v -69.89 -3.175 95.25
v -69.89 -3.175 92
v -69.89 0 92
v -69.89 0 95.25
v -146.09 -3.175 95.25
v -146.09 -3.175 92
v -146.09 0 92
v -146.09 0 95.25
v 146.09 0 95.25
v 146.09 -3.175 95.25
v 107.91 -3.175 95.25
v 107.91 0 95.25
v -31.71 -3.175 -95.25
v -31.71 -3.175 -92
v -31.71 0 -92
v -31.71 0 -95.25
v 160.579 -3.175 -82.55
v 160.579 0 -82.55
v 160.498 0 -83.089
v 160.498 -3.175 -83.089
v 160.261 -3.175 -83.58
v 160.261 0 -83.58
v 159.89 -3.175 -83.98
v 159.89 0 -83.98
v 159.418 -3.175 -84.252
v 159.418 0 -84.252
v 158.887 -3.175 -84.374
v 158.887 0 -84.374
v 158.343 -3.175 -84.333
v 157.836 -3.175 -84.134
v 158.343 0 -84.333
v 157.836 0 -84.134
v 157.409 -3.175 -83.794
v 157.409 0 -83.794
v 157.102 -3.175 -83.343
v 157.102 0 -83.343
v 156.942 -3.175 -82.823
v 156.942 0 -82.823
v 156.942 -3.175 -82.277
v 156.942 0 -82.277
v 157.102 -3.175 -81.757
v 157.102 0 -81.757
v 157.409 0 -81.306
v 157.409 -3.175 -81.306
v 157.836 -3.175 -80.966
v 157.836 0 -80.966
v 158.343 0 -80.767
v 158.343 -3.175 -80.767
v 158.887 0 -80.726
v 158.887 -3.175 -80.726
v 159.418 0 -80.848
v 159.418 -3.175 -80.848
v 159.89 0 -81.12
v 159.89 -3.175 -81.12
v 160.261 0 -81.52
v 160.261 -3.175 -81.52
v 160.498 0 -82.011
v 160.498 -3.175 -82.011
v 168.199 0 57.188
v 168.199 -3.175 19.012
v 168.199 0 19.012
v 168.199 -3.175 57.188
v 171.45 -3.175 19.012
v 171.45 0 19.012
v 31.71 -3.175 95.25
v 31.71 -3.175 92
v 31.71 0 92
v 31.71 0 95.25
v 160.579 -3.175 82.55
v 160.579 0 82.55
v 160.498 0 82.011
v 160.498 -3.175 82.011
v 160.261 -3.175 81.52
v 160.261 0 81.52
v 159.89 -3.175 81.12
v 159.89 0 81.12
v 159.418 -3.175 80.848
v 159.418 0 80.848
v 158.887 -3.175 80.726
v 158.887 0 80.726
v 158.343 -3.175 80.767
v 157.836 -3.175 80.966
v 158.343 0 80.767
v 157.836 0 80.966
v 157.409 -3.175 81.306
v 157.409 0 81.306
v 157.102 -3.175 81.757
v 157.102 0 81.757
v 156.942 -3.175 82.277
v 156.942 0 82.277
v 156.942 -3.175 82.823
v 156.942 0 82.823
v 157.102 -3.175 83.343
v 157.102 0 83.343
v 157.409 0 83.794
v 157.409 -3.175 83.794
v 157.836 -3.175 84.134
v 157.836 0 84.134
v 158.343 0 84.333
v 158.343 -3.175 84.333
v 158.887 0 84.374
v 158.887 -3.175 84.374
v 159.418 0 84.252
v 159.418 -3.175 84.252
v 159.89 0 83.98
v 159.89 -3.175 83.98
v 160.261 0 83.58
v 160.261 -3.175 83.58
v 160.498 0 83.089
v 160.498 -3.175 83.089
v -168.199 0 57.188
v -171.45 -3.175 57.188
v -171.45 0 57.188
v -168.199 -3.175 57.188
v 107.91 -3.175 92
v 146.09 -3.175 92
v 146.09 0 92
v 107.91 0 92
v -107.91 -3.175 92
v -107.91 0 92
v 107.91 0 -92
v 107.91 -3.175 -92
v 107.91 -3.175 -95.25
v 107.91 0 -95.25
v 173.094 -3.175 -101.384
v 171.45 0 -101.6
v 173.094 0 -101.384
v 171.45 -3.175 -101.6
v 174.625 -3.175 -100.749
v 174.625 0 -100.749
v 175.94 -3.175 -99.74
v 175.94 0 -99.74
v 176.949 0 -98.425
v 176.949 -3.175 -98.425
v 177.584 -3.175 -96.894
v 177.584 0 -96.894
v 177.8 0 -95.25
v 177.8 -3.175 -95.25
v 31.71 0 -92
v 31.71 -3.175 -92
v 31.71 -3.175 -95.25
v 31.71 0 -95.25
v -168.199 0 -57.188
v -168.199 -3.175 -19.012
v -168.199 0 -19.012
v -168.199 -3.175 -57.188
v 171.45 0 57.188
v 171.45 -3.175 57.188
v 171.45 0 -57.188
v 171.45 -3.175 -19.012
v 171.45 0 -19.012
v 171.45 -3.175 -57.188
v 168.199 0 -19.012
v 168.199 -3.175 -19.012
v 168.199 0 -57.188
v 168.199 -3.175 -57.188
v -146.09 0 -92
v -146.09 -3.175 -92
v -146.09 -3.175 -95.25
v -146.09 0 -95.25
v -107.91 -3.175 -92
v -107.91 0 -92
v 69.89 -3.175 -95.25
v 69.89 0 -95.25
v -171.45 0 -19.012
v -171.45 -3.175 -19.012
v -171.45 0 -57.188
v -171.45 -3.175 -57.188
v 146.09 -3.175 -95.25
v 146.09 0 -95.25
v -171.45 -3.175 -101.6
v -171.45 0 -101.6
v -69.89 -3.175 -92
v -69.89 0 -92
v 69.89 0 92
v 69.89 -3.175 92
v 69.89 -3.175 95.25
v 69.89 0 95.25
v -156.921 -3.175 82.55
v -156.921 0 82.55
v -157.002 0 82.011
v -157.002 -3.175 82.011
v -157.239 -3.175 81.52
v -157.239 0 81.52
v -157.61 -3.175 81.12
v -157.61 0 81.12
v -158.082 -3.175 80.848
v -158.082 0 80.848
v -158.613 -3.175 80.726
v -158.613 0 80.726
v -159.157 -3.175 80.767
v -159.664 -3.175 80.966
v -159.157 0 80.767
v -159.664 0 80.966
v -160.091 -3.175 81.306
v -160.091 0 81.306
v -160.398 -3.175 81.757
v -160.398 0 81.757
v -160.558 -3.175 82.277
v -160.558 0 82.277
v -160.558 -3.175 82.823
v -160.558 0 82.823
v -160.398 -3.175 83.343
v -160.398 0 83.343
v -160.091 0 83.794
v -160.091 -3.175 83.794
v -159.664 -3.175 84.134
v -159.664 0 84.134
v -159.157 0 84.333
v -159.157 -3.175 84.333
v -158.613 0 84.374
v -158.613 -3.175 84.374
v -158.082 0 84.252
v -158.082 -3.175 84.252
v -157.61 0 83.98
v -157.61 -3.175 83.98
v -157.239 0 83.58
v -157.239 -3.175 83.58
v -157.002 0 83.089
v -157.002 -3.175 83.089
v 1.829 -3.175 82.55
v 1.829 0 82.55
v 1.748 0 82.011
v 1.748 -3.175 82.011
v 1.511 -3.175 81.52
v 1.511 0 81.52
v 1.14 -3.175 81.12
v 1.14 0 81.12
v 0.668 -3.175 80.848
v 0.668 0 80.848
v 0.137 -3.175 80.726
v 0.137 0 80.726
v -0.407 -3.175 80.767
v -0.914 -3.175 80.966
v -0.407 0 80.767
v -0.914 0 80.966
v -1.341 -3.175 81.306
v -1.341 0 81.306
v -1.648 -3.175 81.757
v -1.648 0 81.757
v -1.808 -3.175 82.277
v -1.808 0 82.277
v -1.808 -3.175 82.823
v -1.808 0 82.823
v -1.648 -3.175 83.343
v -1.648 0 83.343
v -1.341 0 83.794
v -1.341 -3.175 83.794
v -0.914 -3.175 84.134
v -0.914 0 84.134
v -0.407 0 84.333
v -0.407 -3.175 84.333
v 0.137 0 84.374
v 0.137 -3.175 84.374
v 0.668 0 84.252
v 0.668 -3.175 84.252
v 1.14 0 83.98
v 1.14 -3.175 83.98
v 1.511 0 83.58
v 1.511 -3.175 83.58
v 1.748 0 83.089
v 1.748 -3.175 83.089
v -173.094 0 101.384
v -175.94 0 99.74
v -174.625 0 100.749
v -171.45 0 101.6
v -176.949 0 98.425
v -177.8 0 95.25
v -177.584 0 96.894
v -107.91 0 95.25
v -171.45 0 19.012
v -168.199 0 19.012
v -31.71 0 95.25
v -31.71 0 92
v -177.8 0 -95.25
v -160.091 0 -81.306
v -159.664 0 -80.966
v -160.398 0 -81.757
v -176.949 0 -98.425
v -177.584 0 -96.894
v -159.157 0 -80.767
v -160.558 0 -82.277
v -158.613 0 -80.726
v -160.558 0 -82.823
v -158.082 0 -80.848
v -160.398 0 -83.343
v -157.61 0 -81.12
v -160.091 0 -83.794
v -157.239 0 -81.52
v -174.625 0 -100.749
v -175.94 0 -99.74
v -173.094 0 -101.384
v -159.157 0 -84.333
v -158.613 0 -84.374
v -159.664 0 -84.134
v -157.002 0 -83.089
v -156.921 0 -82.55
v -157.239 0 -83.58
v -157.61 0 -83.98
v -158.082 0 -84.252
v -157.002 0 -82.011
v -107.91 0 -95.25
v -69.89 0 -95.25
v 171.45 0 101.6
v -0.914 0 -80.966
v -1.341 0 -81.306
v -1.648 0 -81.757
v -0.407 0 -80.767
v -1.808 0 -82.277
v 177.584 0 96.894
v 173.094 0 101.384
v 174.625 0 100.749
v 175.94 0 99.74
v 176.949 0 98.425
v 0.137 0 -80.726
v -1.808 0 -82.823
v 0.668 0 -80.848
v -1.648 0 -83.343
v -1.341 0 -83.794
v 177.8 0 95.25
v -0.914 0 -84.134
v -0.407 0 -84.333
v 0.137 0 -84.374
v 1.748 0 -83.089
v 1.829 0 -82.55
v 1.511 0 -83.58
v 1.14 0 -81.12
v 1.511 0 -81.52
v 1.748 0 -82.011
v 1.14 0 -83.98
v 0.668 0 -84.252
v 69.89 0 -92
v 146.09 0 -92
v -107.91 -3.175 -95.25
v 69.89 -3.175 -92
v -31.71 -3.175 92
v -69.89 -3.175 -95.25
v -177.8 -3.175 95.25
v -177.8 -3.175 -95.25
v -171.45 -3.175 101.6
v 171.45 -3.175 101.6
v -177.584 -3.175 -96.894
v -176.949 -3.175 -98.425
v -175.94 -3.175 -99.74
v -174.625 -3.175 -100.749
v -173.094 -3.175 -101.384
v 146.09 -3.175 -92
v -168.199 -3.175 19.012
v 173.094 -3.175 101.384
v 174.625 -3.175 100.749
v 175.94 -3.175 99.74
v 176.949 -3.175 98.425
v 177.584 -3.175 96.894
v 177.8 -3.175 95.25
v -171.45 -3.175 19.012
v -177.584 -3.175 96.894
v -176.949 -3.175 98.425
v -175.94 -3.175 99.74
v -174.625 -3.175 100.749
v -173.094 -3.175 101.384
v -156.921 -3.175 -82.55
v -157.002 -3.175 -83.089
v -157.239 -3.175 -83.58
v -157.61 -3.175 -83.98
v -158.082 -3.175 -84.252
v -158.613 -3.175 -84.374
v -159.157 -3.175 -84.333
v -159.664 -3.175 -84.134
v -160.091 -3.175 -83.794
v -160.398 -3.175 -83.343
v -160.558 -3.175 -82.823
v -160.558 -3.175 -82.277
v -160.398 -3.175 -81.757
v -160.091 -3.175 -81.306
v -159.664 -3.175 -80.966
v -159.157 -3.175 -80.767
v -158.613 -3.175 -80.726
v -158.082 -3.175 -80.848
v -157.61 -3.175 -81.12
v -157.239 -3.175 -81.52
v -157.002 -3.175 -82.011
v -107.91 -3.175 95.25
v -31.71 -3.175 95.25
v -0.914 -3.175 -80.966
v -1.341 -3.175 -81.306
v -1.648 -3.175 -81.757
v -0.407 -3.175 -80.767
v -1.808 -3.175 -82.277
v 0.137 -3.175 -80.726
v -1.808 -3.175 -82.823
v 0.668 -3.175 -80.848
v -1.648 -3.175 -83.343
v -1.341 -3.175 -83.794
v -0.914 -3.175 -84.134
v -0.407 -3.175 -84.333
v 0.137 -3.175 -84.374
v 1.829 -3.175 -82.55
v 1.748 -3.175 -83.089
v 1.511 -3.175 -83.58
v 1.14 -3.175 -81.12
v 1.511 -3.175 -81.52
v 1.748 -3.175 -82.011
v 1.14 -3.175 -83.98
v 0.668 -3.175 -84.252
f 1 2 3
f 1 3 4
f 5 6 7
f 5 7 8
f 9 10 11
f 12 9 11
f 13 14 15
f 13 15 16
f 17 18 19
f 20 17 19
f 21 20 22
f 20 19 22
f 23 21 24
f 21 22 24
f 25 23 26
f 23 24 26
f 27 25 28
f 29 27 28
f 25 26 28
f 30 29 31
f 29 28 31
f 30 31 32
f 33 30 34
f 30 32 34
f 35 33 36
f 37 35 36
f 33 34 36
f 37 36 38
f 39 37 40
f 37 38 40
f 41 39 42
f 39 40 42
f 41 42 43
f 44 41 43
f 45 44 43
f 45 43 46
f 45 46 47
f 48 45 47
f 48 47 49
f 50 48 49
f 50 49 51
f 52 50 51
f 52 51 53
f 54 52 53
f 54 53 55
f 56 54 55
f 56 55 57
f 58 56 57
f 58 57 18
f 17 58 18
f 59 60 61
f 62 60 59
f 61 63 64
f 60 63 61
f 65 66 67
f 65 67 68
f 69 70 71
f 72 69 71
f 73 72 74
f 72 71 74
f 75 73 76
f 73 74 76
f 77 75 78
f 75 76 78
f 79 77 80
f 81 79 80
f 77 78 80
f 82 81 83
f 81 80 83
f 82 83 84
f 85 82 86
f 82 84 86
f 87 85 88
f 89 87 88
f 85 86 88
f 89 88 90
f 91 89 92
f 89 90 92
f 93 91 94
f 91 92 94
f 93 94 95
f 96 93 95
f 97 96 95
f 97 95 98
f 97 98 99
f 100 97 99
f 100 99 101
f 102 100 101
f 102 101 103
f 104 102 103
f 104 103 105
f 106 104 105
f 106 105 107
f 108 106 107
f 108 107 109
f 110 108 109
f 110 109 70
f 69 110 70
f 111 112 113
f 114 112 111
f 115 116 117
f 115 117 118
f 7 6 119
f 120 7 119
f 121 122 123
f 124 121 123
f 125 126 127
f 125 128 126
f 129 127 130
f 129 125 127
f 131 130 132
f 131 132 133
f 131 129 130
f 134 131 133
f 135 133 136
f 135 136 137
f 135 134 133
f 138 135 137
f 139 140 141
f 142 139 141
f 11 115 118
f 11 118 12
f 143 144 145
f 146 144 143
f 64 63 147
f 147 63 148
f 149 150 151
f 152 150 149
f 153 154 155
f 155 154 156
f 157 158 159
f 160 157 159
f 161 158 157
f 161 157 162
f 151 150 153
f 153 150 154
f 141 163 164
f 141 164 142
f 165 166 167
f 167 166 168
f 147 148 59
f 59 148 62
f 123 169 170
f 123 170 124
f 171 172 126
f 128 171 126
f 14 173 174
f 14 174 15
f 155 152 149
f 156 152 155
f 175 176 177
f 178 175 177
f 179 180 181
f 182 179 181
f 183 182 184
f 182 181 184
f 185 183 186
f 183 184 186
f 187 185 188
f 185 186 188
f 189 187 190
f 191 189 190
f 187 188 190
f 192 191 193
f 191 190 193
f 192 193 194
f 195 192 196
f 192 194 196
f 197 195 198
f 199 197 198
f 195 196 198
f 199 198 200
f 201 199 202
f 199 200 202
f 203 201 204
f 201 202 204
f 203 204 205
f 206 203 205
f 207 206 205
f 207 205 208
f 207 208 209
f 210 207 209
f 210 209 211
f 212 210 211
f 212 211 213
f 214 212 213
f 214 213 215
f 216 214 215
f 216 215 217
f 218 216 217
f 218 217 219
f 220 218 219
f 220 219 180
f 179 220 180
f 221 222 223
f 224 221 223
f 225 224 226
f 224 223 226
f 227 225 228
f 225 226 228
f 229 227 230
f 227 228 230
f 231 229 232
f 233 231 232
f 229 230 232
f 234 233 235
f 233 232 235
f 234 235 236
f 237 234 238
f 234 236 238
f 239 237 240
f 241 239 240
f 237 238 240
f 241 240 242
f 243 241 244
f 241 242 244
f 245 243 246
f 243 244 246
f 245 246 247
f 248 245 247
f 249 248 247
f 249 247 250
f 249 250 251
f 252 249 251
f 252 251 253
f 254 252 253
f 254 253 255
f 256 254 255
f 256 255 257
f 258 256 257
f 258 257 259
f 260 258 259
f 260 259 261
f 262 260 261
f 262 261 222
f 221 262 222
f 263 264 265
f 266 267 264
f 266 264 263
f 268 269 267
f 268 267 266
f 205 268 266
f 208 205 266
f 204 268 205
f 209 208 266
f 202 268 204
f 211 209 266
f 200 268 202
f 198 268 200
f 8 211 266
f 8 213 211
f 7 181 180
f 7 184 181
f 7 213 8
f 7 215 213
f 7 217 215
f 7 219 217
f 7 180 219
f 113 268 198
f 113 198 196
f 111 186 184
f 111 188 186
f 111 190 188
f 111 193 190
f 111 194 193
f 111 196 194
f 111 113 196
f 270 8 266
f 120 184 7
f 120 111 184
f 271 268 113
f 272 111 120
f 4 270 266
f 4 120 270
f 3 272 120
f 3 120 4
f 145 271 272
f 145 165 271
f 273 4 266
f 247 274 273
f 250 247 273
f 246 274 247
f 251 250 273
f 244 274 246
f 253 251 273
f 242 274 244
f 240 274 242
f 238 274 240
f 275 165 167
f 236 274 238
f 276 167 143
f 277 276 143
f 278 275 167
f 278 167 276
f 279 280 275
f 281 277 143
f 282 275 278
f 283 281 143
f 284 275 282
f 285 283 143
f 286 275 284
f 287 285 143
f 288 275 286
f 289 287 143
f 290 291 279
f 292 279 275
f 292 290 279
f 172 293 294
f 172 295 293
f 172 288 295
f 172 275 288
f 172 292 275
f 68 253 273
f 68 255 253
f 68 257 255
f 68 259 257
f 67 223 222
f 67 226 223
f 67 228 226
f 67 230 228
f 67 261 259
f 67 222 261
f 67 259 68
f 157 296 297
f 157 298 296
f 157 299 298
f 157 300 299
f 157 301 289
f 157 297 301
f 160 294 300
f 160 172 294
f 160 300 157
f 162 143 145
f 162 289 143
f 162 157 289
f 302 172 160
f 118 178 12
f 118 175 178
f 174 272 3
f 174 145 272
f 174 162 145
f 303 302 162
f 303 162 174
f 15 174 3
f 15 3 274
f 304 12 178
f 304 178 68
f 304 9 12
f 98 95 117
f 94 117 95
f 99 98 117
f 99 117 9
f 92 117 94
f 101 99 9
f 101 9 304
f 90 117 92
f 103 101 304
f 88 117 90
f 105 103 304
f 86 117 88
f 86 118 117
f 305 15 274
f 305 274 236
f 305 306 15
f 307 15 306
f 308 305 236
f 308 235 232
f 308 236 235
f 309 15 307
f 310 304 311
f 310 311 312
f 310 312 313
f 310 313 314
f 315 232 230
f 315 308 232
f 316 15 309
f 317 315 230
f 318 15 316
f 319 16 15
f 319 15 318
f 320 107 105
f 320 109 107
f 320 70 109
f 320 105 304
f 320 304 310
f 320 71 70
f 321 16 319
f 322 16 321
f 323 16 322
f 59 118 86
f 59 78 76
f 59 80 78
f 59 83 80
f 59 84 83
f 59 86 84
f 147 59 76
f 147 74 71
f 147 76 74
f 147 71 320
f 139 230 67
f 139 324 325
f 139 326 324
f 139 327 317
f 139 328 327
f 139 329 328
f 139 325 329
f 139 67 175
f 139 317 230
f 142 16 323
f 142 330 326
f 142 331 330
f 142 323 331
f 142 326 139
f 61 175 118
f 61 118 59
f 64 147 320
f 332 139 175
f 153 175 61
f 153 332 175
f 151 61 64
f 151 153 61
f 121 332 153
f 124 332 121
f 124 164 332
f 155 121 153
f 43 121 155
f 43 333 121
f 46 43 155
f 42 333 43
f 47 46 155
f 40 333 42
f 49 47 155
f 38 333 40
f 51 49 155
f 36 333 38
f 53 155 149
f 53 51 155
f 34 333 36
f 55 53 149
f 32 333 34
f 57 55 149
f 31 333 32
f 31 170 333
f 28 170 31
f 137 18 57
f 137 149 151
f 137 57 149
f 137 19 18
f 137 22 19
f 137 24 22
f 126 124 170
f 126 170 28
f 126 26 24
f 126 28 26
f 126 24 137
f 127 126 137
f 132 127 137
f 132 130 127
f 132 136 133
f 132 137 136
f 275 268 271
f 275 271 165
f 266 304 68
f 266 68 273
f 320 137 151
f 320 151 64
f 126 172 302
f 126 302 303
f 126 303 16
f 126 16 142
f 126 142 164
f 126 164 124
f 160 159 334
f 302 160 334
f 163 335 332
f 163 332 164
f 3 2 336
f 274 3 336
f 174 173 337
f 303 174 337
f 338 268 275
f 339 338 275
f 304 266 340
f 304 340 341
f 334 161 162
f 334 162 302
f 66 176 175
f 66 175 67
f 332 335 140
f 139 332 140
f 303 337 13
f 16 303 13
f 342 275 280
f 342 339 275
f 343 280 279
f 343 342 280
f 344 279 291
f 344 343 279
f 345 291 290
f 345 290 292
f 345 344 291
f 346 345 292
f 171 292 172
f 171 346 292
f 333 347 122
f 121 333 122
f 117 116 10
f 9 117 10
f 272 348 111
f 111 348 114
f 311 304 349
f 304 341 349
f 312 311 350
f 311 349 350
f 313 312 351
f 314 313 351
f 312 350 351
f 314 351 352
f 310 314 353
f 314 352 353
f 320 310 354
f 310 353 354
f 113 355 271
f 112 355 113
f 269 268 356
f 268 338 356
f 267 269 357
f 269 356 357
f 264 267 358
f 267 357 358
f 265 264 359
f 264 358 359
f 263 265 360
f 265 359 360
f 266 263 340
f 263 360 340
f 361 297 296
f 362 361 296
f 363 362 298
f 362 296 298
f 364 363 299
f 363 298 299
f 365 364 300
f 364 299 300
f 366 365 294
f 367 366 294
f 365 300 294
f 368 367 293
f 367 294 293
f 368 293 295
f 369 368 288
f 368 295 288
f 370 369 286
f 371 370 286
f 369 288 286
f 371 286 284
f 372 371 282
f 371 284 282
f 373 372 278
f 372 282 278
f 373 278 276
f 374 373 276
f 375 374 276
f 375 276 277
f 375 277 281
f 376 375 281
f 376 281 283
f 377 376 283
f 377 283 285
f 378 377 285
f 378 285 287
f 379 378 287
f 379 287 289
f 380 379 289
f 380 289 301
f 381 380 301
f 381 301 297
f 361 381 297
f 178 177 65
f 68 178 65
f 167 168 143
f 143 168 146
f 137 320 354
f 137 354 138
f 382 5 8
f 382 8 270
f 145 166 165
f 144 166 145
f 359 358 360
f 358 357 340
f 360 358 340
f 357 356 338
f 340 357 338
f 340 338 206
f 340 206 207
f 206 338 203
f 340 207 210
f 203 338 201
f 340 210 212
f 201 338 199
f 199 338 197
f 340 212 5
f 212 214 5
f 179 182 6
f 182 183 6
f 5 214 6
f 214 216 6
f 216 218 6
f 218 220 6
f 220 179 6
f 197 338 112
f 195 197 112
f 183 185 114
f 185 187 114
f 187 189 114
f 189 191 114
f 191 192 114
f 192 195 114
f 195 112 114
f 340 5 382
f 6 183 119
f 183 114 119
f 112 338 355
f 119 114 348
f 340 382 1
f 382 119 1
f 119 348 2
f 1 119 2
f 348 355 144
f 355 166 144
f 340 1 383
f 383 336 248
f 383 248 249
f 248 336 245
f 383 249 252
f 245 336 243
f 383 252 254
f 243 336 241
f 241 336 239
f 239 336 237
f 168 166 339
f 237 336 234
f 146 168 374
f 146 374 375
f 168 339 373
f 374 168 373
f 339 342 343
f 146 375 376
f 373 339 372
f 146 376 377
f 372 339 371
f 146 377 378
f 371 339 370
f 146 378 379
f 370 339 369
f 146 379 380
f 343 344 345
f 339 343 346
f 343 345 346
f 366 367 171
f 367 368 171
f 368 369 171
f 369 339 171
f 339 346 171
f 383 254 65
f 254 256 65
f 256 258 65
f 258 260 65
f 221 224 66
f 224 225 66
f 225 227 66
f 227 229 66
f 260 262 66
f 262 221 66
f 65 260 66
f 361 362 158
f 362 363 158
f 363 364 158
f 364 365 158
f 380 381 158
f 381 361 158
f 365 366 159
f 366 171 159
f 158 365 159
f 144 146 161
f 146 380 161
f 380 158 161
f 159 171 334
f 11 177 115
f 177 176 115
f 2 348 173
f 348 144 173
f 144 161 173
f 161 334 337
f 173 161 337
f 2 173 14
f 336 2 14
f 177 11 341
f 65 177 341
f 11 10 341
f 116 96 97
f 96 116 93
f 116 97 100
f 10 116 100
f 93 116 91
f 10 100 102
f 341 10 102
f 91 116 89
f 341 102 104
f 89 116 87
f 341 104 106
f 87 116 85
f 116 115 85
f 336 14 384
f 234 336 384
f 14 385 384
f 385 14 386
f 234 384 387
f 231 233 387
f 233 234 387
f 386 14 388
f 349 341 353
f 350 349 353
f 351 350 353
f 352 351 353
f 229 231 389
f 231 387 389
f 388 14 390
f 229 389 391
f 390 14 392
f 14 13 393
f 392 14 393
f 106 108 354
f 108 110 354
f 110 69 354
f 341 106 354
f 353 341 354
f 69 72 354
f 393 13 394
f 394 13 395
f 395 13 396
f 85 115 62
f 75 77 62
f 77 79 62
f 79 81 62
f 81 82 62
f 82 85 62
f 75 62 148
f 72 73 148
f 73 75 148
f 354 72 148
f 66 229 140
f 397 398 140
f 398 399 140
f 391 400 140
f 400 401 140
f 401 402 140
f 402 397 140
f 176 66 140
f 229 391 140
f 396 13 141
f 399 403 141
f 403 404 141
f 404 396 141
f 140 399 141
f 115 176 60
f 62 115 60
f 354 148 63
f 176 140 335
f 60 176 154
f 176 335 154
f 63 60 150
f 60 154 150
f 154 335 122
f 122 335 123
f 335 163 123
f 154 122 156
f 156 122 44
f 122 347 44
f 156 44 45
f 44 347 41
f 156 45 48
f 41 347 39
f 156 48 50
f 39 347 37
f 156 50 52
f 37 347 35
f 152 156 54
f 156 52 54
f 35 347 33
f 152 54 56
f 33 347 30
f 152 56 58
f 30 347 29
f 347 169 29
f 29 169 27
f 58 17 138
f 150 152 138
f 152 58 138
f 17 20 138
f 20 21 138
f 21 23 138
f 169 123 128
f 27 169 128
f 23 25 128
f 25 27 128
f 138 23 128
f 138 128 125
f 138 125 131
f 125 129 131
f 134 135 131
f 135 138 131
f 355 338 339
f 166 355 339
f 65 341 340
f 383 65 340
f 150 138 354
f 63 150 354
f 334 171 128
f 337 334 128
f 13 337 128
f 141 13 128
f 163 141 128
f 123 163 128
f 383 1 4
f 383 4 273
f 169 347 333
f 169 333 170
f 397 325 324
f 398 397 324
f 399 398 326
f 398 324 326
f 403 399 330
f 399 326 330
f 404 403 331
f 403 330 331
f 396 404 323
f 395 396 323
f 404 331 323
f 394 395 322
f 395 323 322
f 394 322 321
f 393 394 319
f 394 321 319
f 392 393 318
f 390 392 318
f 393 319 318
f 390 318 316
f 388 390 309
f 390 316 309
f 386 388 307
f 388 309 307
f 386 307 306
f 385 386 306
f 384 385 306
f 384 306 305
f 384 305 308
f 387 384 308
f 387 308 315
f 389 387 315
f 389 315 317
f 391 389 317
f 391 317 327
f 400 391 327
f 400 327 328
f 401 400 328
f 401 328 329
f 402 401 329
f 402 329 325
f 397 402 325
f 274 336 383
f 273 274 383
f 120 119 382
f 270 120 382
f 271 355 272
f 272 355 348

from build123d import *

# Parameters (mm, degrees)
PANEL_PROFILE_2_W       = 355.6
PANEL_PROFILE_2_H       = 203.2
PANEL_PROFILE_DEPTH     = 3.175
SKETCH8_R               = 1.8288
CUT_EXTRUDE1_DEPTH      = 10
FILLET1_R               = 6.35
CUT_EXTRUDE2_START      = -4.175
SKETCH9_W               = 38.18
SKETCH9_H               = 3.25
CUT_EXTRUDE2_DEPTH      = 5.175
MIRROR2_START           = -4.175
MIRROR2_COPY_1_SKETCH_W = 38.18
MIRROR2_COPY_1_SKETCH_H = 3.25
MIRROR2_COPY_1_DEPTH    = 5.175
CUT_EXTRUDE3_START      = -4.175
SKETCH10_W              = 3.2512
SKETCH10_H              = 38.1762
CUT_EXTRUDE3_DEPTH      = 5.175
MIRROR4_START           = -4.175
MIRROR4_COPY_1_SKETCH_W = 3.2512
MIRROR4_COPY_1_SKETCH_H = 38.1762
MIRROR4_COPY_1_DEPTH    = 5.175


with BuildPart() as part:
    # Panel Profile 2 → Panel-Profile (new body)
    with BuildSketch(Plane(origin=(0, 0, 0), x_dir=(1, 0, 0), z_dir=(0, 1, 0))):
        Rectangle(PANEL_PROFILE_2_W, PANEL_PROFILE_2_H)
    extrude(amount=-PANEL_PROFILE_DEPTH)

    # Sketch8 → Cut-Extrude1 (cut)
    with BuildSketch(Plane(origin=(0, 0, 0), x_dir=(1, 0, 0), z_dir=(0, 1, 0))):
        with Locations((-158.75, 82.55)):
            Circle(SKETCH8_R)
        with Locations((0, 82.55)):
            Circle(SKETCH8_R)
        with Locations((158.75, 82.55)):
            Circle(SKETCH8_R)
        with Locations((-158.75, -82.55)):
            Circle(SKETCH8_R)
        with Locations((0, -82.55)):
            Circle(SKETCH8_R)
        with Locations((158.75, -82.55)):
            Circle(SKETCH8_R)
    extrude(amount=-CUT_EXTRUDE1_DEPTH, mode=Mode.SUBTRACT)

    # Fillet1
    fillet1_edges = [part.edges().sort_by_distance(p)[0] for p in [
        (177.8, -1.5875, 101.6),
        (-177.8, -1.5875, 101.6),
        (-177.8, -1.5875, -101.6),
        (177.8, -1.5875, -101.6),
    ]]
    fillet(fillet1_edges, radius=FILLET1_R)

    # Sketch9 → Cut-Extrude2 (cut)
    with BuildSketch(Plane(origin=(0, 0, 0), x_dir=(1, 0, 0), z_dir=(0, 1, 0)).offset(CUT_EXTRUDE2_START)):
        with Locations((-127, 93.625)):
            Rectangle(SKETCH9_W, SKETCH9_H)
        with Locations((-50.8, 93.625)):
            Rectangle(SKETCH9_W, SKETCH9_H)
    cut_extrude2 = extrude(amount=CUT_EXTRUDE2_DEPTH, mode=Mode.SUBTRACT)

    # Mirror1: Cut-Extrude2 across plane
    add(cut_extrude2.mirror(Plane(origin=(0, 0, 0), x_dir=(0, 0, 1), z_dir=(1, 0, 0))), mode=Mode.SUBTRACT)

    # Mirror2: Cut-Extrude2 across plane
    add(cut_extrude2.mirror(Plane.XY), mode=Mode.SUBTRACT)

    # Mirror2 copy 1 sketch → Mirror2 copy 1 (cut)
    with BuildSketch(Plane(origin=(0, 0, 0), x_dir=(-1, 0, 0), z_dir=(0, 1, 0)).offset(MIRROR2_START)):
        with Locations((-127, 93.625)):
            Rectangle(MIRROR2_COPY_1_SKETCH_W, MIRROR2_COPY_1_SKETCH_H)
        with Locations((-50.8, 93.625)):
            Rectangle(MIRROR2_COPY_1_SKETCH_W, MIRROR2_COPY_1_SKETCH_H)
    extrude(amount=MIRROR2_COPY_1_DEPTH, mode=Mode.SUBTRACT)

    # Sketch10 → Cut-Extrude3 (cut)
    with BuildSketch(Plane(origin=(0, 0, 0), x_dir=(1, 0, 0), z_dir=(0, 1, 0)).offset(CUT_EXTRUDE3_START)):
        with Locations((-169.8244, 38.1)):
            Rectangle(SKETCH10_W, SKETCH10_H)
    cut_extrude3 = extrude(amount=CUT_EXTRUDE3_DEPTH, mode=Mode.SUBTRACT)

    # Mirror3: Cut-Extrude3 across plane
    add(cut_extrude3.mirror(Plane.XY), mode=Mode.SUBTRACT)

    # Mirror4: Cut-Extrude3 across plane
    add(cut_extrude3.mirror(Plane(origin=(0, 0, 0), x_dir=(0, 0, 1), z_dir=(1, 0, 0))), mode=Mode.SUBTRACT)

    # Mirror4 copy 1 sketch → Mirror4 copy 1 (cut)
    with BuildSketch(Plane(origin=(0, 0, 0), x_dir=(-1, 0, 0), z_dir=(0, 1, 0)).offset(MIRROR4_START)):
        with Locations((-169.8244, 38.1)):
            Rectangle(MIRROR4_COPY_1_SKETCH_W, MIRROR4_COPY_1_SKETCH_H)
    extrude(amount=MIRROR4_COPY_1_DEPTH, mode=Mode.SUBTRACT)


solid = part.part
